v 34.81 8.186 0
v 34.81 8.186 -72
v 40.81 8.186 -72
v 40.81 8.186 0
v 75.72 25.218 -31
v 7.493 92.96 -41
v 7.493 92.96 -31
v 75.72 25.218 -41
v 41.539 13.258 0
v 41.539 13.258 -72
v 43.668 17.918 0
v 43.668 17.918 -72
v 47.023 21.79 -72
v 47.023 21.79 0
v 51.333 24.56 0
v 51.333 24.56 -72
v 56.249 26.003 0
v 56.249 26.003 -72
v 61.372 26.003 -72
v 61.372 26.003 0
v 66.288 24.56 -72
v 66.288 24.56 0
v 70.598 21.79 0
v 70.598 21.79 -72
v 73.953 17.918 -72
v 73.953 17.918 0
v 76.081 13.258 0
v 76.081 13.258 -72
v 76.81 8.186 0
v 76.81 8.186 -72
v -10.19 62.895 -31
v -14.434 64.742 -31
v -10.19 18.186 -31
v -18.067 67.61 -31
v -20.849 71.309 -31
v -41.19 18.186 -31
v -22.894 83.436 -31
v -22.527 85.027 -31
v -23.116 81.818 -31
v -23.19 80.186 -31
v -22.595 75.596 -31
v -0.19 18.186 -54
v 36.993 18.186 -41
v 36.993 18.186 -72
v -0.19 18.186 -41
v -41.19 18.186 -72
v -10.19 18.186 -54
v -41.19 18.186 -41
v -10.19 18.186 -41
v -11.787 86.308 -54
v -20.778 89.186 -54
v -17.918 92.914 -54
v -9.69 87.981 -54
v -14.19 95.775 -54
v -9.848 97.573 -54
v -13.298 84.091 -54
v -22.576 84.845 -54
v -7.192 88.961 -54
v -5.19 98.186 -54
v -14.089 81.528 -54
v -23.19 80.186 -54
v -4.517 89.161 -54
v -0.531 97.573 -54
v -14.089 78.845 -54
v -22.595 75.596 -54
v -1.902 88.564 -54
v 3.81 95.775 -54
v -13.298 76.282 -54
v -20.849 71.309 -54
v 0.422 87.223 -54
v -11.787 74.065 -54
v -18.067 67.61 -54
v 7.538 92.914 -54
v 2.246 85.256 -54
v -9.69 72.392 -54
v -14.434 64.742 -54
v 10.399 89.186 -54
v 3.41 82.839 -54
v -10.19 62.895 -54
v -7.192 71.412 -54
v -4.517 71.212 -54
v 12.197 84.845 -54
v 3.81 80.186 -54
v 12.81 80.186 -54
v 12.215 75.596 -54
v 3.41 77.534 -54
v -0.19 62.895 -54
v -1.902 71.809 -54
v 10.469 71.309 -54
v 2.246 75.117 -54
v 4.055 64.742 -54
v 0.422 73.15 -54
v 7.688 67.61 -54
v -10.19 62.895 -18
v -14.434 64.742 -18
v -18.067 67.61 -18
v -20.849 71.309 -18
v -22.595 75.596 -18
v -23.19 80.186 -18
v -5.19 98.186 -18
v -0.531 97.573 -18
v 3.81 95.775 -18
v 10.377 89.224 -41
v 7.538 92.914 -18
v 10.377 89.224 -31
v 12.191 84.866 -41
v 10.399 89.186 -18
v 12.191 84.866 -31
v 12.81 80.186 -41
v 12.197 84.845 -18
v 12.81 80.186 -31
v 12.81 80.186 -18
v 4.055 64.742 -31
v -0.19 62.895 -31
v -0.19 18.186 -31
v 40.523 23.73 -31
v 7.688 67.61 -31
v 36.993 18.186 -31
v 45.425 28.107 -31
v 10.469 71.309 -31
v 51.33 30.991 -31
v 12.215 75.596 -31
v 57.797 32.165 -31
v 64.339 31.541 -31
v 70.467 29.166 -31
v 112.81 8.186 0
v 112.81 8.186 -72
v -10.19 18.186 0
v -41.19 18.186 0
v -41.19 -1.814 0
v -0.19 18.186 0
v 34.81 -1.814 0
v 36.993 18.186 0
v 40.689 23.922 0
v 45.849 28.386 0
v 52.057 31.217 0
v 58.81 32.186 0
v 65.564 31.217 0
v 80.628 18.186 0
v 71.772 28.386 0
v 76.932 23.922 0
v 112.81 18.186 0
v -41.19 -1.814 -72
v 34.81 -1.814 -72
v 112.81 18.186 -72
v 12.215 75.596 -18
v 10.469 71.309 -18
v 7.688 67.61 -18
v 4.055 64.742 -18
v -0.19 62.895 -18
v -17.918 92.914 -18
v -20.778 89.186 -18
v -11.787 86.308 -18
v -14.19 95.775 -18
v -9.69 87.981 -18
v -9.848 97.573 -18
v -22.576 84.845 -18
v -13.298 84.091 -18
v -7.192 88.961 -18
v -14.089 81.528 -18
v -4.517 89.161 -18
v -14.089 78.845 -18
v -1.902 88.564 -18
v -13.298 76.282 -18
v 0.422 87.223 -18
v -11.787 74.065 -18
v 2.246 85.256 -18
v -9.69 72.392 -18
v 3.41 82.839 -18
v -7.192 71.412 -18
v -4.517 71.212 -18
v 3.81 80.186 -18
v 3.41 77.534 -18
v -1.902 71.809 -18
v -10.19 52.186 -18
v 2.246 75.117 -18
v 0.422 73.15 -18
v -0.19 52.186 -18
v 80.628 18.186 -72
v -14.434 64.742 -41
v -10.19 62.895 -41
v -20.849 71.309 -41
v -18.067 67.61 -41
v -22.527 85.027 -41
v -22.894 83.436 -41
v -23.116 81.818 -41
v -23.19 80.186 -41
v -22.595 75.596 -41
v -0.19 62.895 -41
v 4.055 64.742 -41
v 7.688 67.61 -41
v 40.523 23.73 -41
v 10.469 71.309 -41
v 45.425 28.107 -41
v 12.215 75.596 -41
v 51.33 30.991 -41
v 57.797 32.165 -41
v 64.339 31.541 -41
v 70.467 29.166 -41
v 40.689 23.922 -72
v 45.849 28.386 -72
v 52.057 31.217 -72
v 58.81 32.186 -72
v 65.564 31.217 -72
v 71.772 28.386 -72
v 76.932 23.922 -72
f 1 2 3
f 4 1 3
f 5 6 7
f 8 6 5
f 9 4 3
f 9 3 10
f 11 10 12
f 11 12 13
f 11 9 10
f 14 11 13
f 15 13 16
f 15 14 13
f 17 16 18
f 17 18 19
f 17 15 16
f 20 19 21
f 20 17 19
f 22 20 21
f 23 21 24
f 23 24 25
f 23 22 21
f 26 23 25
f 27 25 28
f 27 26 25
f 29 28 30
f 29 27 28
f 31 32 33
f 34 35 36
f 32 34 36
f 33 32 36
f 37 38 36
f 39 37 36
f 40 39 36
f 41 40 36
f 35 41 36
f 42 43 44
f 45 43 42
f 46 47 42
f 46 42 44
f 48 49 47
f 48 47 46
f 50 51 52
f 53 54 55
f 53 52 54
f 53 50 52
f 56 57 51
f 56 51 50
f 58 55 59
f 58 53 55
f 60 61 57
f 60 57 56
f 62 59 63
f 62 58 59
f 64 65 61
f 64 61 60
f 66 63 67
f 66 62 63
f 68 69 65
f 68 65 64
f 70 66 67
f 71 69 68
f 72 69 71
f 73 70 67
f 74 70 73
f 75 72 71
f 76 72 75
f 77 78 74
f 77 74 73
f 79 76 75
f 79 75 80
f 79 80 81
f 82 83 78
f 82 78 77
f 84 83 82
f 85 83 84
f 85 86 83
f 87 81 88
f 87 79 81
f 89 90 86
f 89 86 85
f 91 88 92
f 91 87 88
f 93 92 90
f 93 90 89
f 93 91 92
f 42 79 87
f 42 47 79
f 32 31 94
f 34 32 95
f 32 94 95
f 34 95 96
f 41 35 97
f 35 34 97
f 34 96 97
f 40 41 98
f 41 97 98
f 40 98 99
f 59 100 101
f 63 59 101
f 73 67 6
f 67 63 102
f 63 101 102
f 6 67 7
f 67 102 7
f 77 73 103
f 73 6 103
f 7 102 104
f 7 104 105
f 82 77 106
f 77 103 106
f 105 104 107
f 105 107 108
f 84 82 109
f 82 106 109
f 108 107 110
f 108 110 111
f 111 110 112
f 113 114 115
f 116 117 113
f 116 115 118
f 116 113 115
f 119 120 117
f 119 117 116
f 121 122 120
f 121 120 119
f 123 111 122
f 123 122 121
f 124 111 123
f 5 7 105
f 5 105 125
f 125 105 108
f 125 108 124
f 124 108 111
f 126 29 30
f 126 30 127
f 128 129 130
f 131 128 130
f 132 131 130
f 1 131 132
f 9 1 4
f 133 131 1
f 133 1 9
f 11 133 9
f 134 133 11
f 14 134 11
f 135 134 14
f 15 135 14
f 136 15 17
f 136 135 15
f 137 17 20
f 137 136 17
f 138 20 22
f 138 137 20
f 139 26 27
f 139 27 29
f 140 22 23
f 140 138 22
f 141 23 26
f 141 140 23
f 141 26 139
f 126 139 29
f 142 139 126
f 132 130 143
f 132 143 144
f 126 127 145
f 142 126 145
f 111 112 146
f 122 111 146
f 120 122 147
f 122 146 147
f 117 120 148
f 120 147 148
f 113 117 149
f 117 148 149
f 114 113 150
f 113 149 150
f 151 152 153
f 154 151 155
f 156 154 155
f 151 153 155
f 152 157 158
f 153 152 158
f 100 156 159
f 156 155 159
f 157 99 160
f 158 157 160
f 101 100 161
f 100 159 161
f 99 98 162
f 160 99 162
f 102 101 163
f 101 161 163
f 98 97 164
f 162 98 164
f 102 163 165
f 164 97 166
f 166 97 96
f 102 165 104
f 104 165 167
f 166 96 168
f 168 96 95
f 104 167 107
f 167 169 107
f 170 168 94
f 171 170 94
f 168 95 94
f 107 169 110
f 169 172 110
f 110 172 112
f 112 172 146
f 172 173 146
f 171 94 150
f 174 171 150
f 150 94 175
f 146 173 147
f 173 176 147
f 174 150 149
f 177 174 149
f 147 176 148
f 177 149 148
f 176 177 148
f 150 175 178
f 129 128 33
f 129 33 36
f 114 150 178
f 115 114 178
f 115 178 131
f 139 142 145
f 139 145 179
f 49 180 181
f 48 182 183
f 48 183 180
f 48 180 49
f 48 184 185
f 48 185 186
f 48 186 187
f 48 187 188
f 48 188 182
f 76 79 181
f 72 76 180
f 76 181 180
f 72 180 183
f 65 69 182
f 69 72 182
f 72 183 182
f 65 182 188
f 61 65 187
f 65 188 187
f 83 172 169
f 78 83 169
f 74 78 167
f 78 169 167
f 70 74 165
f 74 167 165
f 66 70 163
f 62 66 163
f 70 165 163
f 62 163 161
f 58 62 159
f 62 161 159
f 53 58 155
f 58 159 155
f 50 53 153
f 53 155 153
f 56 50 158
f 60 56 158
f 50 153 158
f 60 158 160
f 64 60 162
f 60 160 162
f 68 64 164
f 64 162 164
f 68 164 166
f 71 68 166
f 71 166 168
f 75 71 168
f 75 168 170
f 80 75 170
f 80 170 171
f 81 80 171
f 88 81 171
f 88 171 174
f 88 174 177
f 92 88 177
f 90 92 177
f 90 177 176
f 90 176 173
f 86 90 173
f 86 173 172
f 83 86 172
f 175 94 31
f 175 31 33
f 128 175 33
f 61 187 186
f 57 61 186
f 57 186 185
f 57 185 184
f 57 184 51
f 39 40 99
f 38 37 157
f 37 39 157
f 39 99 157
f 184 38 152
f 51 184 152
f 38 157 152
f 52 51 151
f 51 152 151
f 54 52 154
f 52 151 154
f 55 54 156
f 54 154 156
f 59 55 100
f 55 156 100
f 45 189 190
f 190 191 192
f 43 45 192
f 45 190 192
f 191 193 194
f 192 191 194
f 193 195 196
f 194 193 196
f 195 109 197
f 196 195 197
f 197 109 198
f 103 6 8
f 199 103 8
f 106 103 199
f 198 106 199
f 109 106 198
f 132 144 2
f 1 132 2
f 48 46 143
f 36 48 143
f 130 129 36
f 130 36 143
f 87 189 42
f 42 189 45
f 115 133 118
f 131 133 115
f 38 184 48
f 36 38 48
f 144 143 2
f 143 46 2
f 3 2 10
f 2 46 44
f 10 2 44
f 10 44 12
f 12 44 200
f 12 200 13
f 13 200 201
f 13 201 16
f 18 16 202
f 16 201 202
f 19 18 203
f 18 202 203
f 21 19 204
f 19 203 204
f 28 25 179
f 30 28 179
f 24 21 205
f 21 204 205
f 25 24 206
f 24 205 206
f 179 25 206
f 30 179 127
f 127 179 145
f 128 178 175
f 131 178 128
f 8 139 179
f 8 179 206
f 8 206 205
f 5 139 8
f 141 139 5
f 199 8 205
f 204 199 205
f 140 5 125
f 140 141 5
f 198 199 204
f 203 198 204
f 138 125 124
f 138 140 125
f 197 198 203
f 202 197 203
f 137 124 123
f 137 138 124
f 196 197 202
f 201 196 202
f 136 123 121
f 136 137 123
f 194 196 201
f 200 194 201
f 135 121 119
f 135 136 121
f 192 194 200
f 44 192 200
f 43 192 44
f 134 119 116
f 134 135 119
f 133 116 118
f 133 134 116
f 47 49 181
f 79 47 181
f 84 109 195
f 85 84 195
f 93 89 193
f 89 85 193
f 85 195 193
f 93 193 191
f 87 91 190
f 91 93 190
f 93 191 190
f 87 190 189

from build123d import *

# Parameters (mm, degrees)
BOSS_EXTRUDE1_DEPTH = 72
SKETCH2_W           = 36
SKETCH2_H           = 36
BOSS_EXTRUDE3_DEPTH = 80
SKETCH4_R           = 9
CUT_EXTRUDE2_DEPTH  = 80
CUT_EXTRUDE3_DEPTH  = 80
RIB1_REACH          = 155.827
SKETCH7_WALL_W      = 405.799744174
SKETCH7_WALL_H      = 10
RIB4_REACH          = 155.827
SKETCH8_WALL_W      = 379.051427732
SKETCH8_WALL_H      = 10
RIB5_REACH          = 171.554
SKETCH12_WALL_W     = 379.578938684
SKETCH12_WALL_H     = 10


with BuildPart() as part:
    # Sketch1 → Boss-Extrude1 (new body)
    with BuildSketch(Plane.XY):
        with BuildLine():
            Line((-41.189710611, -1.813504823), (34.810289389, -1.813504823))
            Line((34.810289389, -1.813504823), (34.810289389, 8.186495177))
            Line((34.810289389, 8.186495177), (40.810289389, 8.186495177))
            ThreePointArc((40.810289389, 8.186495177), (58.810289389, 26.186495177), (76.810289389, 8.186495177))
            Line((76.810289389, 8.186495177), (112.810289389, 8.186495177))
            Line((112.810289389, 8.186495177), (112.810289389, 18.186495177))
            Line((112.810289389, 18.186495177), (80.627713618, 18.186495177))
            ThreePointArc((80.627713618, 18.186495177), (58.810289389, 32.186495177), (36.99286516, 18.186495177))
            Line((36.99286516, 18.186495177), (-41.189710611, 18.186495177))
            Line((-41.189710611, 18.186495177), (-41.189710611, -1.813504823))
        make_face()
    extrude(amount=-BOSS_EXTRUDE1_DEPTH)

    # Sketch2 → Boss-Extrude3 (add)
    with BuildSketch(Plane(origin=(0, 18.186495177, 0), x_dir=(1, 0, 0), z_dir=(0, 1, 0))):
        with Locations((-5.189710611, 36)):
            Rectangle(SKETCH2_W, SKETCH2_H)
    extrude(amount=BOSS_EXTRUDE3_DEPTH)

    # Sketch4 → Cut-Extrude2 (cut)
    with BuildSketch(Plane.XY.offset(-18)):
        with Locations((-5.189710611, 80.186495177)):
            Circle(SKETCH4_R)
    extrude(amount=-CUT_EXTRUDE2_DEPTH, mode=Mode.SUBTRACT)

    # Sketch5 → Cut-Extrude3 (cut)
    with BuildSketch(Plane.XY.offset(-18)):
        with BuildLine():
            Line((-10.189710611, 18.186495177), (-10.189710611, 62.186495177))
            Line((-10.189710611, 62.186495177), (-10.189710611, 62.894878711))
            ThreePointArc((-10.189710611, 62.894878711), (-19.577205181, 69.36984135), (-23.189710611, 80.186495177))
            Line((-23.189710611, 80.186495177), (-23.189710611, 18.186495177))
            Line((-23.189710611, 18.186495177), (-10.189710611, 18.186495177))
        make_face()
        with BuildLine():
            Line((-0.189710611, 62.186495177), (-0.189710611, 18.186495177))
            Line((-0.189710611, 18.186495177), (12.810289389, 18.186495177))
            Line((12.810289389, 18.186495177), (12.810289389, 80.186495177))
            ThreePointArc((12.810289389, 80.186495177), (9.197783959, 69.36984135), (-0.189710611, 62.894878711))
            Line((-0.189710611, 62.894878711), (-0.189710611, 62.186495177))
        make_face()
        with BuildLine():
            Line((12.810289389, 98.186495177), (-5.1897106, 98.186495177))
            ThreePointArc((-5.1897106, 98.186495177), (7.538211454, 92.914417234), (12.810289389, 80.186495177))
            Line((12.810289389, 80.186495177), (12.810289389, 98.186495177))
        make_face()
        with BuildLine():
            Line((-23.189710611, 98.186495177), (-23.189710611, 80.186495177))
            ThreePointArc((-23.189710611, 80.186495177), (-17.917632668, 92.914417242), (-5.1897106, 98.186495177))
            Line((-5.1897106, 98.186495177), (-23.189710611, 98.186495177))
        make_face()
    extrude(amount=-CUT_EXTRUDE3_DEPTH, mode=Mode.SUBTRACT)

    # Sketch7 wall → Rib1 (add, up to next)
    with BuildSketch(Plane(origin=(41.606445938, 59.088634331, -36), x_dir=(0.709625674027, -0.704578883278, 0), z_dir=(0.704578883278, 0.709625674027, 0)), mode=Mode.PRIVATE) as rib1_sk1:
        Rectangle(SKETCH7_WALL_W, SKETCH7_WALL_H)
    rib1_tool1 = extrude(rib1_sk1.sketch, amount=-RIB1_REACH, mode=Mode.PRIVATE) - part.part
    add(rib1_tool1.solids().sort_by_distance((41.606445938, 59.088634331, -36))[0])

    # Sketch8 wall → Rib4 (add, up to next)
    with BuildSketch(Plane(origin=(-31.858144991, 51.606876429, -36), x_dir=(-0.268931250293, -0.963159375501, 0), z_dir=(0.963159375501, -0.268931250293, 0)), mode=Mode.PRIVATE) as rib4_sk1:
        Rectangle(SKETCH8_WALL_W, SKETCH8_WALL_H)
    rib4_tool1 = extrude(rib4_sk1.sketch, amount=RIB4_REACH, mode=Mode.PRIVATE) - part.part
    add(rib4_tool1.solids().sort_by_distance((-31.858144991, 51.606876429, -36))[0])

    # Sketch12 wall → Rib5 (add, up to next)
    with BuildSketch(Plane(origin=(-5.189710611, 35.186495177, -9), x_dir=(0, -0.883787916347, 0.467887720419), z_dir=(0, 0.467887720419, 0.883787916347)), mode=Mode.PRIVATE) as rib5_sk1:
        Rectangle(SKETCH12_WALL_W, SKETCH12_WALL_H)
    rib5_tool1 = extrude(rib5_sk1.sketch, amount=-RIB5_REACH, mode=Mode.PRIVATE) - part.part
    add(rib5_tool1.solids().sort_by_distance((-5.189710611, 35.186495177, -9))[0])


solid = part.part
